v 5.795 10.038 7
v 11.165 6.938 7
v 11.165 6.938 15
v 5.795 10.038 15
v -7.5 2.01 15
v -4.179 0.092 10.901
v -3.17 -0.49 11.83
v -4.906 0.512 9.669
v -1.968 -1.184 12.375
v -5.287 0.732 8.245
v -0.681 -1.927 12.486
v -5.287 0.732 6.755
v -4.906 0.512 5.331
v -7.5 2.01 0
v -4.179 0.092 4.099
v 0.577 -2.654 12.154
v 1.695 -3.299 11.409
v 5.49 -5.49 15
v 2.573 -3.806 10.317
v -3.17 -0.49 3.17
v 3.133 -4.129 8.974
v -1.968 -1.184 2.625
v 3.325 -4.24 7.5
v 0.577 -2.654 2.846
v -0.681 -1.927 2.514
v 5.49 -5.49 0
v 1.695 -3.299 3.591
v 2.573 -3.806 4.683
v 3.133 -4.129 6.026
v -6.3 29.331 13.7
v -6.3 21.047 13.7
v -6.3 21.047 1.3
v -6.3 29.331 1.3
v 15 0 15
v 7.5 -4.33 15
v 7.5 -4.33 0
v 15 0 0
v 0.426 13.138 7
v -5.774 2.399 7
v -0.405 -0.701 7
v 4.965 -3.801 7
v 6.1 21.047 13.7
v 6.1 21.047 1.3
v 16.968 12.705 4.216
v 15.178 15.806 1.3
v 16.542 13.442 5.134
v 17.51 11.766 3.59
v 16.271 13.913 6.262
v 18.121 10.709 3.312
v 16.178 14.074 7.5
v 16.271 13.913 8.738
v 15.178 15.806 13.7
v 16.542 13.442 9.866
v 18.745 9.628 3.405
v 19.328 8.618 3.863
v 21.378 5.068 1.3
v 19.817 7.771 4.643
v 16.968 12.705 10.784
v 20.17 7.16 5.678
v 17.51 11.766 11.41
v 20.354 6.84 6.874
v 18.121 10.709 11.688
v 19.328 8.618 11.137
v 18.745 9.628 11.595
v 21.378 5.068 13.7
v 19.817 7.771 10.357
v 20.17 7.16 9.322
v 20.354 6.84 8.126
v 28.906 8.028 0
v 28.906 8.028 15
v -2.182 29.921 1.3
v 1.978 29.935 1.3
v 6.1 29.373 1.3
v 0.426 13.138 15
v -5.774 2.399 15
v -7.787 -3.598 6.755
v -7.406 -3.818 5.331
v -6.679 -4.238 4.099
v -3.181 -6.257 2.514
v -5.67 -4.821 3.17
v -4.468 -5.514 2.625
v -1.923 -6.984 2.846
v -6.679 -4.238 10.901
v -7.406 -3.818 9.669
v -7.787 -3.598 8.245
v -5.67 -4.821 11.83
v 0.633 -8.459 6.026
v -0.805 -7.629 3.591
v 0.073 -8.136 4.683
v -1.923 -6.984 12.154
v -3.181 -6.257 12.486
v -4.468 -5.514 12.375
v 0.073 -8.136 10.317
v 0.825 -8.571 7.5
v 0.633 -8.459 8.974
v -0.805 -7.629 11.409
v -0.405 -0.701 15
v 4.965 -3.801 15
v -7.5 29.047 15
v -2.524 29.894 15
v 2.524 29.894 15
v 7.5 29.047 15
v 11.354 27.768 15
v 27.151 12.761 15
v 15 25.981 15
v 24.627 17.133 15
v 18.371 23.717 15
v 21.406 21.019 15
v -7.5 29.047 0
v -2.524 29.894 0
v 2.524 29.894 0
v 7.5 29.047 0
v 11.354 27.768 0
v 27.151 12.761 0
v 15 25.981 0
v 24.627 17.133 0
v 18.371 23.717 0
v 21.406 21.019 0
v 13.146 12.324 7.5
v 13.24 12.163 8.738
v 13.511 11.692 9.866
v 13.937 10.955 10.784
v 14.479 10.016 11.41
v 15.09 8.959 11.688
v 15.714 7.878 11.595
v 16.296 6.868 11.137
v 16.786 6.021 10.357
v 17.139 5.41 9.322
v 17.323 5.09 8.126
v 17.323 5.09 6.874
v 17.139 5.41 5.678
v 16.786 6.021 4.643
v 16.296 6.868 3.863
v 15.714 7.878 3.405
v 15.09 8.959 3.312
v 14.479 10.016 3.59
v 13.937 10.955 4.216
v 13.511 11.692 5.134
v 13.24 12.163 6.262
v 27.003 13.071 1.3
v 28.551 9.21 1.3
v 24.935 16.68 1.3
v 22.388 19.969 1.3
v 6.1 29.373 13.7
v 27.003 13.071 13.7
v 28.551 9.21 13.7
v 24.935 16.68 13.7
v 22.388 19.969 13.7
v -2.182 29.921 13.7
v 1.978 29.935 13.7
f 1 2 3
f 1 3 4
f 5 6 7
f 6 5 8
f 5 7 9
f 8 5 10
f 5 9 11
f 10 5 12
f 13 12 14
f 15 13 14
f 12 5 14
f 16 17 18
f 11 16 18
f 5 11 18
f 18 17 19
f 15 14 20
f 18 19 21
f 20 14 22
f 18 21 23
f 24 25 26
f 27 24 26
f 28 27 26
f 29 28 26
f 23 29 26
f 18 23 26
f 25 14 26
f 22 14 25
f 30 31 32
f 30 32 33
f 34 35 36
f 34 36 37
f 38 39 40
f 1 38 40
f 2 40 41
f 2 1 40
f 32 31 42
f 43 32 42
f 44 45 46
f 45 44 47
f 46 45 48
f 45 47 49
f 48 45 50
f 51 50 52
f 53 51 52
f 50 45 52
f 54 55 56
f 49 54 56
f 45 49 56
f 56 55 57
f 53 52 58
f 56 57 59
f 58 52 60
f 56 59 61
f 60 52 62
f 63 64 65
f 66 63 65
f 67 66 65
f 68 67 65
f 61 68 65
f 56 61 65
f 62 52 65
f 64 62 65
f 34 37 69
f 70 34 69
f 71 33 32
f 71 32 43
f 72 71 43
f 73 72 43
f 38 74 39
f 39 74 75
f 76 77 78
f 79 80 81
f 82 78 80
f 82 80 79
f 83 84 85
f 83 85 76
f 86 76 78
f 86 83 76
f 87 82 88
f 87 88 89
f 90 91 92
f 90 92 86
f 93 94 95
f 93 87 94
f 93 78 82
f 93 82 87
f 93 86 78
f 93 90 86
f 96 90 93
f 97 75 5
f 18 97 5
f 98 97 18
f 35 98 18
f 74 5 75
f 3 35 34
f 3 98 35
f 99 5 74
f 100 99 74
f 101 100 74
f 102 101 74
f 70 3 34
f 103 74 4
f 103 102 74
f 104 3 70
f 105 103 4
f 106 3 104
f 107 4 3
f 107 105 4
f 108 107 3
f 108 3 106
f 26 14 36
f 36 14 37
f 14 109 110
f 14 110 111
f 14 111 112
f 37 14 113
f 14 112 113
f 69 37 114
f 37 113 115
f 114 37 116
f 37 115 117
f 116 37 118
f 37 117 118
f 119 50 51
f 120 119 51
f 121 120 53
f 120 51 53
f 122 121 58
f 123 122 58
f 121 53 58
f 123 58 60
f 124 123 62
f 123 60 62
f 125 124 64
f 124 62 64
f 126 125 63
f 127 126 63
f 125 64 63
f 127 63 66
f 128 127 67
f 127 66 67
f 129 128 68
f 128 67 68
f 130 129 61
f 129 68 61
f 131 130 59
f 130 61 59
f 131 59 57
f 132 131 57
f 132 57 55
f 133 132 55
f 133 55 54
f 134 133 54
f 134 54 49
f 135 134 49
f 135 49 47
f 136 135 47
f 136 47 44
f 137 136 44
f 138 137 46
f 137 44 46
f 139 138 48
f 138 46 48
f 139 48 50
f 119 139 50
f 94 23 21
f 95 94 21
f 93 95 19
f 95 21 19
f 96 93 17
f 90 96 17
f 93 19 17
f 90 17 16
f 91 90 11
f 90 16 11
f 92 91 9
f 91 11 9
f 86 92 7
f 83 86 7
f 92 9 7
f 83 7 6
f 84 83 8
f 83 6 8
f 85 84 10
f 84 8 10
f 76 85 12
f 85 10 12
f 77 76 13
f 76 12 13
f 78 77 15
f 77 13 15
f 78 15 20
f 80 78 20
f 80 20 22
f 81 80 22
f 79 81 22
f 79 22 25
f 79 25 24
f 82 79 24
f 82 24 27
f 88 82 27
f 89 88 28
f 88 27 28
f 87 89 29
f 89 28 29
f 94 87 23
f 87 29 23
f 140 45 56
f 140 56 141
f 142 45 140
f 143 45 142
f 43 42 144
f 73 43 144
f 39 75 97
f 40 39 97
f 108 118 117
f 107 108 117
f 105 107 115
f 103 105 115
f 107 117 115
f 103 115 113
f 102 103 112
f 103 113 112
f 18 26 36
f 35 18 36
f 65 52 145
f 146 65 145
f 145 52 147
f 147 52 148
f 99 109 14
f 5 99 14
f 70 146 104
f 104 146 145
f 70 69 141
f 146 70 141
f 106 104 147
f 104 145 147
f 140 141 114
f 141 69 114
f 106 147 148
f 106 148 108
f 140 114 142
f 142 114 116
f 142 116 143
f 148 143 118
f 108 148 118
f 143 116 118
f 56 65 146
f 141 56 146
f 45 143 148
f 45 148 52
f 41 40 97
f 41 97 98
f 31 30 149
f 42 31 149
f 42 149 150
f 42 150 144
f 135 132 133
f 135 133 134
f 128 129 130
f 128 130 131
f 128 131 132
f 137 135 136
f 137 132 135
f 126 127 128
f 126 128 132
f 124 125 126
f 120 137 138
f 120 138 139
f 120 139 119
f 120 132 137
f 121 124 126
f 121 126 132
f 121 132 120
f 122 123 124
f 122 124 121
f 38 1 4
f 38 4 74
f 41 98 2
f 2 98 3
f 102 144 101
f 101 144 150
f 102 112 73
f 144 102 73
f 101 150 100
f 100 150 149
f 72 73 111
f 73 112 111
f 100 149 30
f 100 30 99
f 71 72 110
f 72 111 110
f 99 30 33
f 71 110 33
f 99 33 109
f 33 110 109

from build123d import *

# Parameters (mm, degrees)
F1_DEPTH = 15
F3_DEPTH = 8
F5_START = -1.3
F4_W     = 12.4
F4_H     = 10.6533105238
F5_DEPTH = 12.4
F6_R     = 5
F7_DEPTH = 5
F8_R     = 4.2
F9_DEPTH = 3.5


with BuildPart() as f1:
    # F0 (on Top) → F1 (new body)
    with BuildSketch(Plane.XY):
        with BuildLine():
            Line((7.5, 12.9903810568), (7.5, 29.0473750966))
            ThreePointArc((7.5, 29.0473750966), (0, 30), (-7.5, 29.0473750966))
            Line((-7.5, 29.0473750966), (-7.5, 12.9903810568))
            Line((-7.5, 12.9903810568), (0, 8.6602540378))
            Line((0, 8.6602540378), (7.5, 12.9903810568))
        make_face()
        with BuildLine():
            Line((7.5, 12.9903810568), (21.4057647469, 21.0188780767))
            ThreePointArc((21.4057647469, 21.0188780767), (15, 25.9807621135), (7.5, 29.0473750966))
            Line((7.5, 29.0473750966), (7.5, 12.9903810568))
        make_face()
        with BuildLine():
            Line((15, 0), (28.9057647469, 8.0284970199))
            ThreePointArc((28.9057647469, 8.0284970199), (25.9807621135, 15), (21.4057647469, 21.0188780767))
            Line((21.4057647469, 21.0188780767), (7.5, 12.9903810568))
            Line((7.5, 12.9903810568), (7.5, 4.3301270189))
            Line((7.5, 4.3301270189), (15, 0))
        make_face()
        Polygon((7.5, -4.3301270189), (15, 0), (7.5, 4.3301270189), align=None)
        Polygon((7.5, 4.3301270189), (7.5, 12.9903810568), (0, 8.6602540378), align=None)
        Polygon((5.4903810568, -5.4903810568), (7.5, -4.3301270189), (7.5, 4.3301270189), (0, 8.6602540378), (-7.5, 4.3301270189), (-7.5, 2.0096189432), align=None)
        Polygon((-7.5, 4.3301270189), (0, 8.6602540378), (-7.5, 12.9903810568), align=None)
    extrude(amount=F1_DEPTH)

    # F2 (on face) → F3 (cut)
    with BuildSketch(Plane.XY.offset(15)):
        Polygon((-5.7741669751, 2.3988494278), (-0.4048094716, -0.7011505722), (5.7951905284, 10.0375644347), (0.4258330249, 13.1375644347), align=None)
        Polygon((5.7951905284, 10.0375644347), (-0.4048094716, -0.7011505722), (4.9645480318, -3.8011505722), (11.1645480318, 6.9375644347), align=None)
    extrude(amount=-F3_DEPTH, mode=Mode.SUBTRACT)

    # F4 (on face) → F5 (cut)
    with BuildSketch(Plane.XY.offset(15).offset(F5_START)):
        with Locations((-0.1, 26.3740303584)):
            Rectangle(F4_W, F4_H)
        Polygon((15.1775615166, 15.8064425114), (21.3775615166, 5.0677275044), (35.9265312226, 13.4675790806), (29.7265312226, 24.2062940875), align=None)
    extrude(amount=-F5_DEPTH, mode=Mode.SUBTRACT)

    # F6 (on face) → F7 (join)
    with BuildSketch(Plane(origin=(-1.0048094716, -1.7403810568, 0), x_dir=(0.8660254038, -0.5, 0), z_dir=(-0.5, -0.8660254038, 0))):
        with Locations((0, 7.5)):
            Circle(F6_R)
    extrude(amount=F7_DEPTH)

    # F8 (on face) → F9 (cut)
    with BuildSketch(Plane(origin=(18.2275615166, 10.5236875483, 0), x_dir=(-0.5, 0.8660254038, 0), z_dir=(0.8660254038, 0.5, 0))):
        with Locations((-0.1, 7.5)):
            Circle(F8_R)
    extrude(amount=-F9_DEPTH, mode=Mode.SUBTRACT)


solid = f1.part
